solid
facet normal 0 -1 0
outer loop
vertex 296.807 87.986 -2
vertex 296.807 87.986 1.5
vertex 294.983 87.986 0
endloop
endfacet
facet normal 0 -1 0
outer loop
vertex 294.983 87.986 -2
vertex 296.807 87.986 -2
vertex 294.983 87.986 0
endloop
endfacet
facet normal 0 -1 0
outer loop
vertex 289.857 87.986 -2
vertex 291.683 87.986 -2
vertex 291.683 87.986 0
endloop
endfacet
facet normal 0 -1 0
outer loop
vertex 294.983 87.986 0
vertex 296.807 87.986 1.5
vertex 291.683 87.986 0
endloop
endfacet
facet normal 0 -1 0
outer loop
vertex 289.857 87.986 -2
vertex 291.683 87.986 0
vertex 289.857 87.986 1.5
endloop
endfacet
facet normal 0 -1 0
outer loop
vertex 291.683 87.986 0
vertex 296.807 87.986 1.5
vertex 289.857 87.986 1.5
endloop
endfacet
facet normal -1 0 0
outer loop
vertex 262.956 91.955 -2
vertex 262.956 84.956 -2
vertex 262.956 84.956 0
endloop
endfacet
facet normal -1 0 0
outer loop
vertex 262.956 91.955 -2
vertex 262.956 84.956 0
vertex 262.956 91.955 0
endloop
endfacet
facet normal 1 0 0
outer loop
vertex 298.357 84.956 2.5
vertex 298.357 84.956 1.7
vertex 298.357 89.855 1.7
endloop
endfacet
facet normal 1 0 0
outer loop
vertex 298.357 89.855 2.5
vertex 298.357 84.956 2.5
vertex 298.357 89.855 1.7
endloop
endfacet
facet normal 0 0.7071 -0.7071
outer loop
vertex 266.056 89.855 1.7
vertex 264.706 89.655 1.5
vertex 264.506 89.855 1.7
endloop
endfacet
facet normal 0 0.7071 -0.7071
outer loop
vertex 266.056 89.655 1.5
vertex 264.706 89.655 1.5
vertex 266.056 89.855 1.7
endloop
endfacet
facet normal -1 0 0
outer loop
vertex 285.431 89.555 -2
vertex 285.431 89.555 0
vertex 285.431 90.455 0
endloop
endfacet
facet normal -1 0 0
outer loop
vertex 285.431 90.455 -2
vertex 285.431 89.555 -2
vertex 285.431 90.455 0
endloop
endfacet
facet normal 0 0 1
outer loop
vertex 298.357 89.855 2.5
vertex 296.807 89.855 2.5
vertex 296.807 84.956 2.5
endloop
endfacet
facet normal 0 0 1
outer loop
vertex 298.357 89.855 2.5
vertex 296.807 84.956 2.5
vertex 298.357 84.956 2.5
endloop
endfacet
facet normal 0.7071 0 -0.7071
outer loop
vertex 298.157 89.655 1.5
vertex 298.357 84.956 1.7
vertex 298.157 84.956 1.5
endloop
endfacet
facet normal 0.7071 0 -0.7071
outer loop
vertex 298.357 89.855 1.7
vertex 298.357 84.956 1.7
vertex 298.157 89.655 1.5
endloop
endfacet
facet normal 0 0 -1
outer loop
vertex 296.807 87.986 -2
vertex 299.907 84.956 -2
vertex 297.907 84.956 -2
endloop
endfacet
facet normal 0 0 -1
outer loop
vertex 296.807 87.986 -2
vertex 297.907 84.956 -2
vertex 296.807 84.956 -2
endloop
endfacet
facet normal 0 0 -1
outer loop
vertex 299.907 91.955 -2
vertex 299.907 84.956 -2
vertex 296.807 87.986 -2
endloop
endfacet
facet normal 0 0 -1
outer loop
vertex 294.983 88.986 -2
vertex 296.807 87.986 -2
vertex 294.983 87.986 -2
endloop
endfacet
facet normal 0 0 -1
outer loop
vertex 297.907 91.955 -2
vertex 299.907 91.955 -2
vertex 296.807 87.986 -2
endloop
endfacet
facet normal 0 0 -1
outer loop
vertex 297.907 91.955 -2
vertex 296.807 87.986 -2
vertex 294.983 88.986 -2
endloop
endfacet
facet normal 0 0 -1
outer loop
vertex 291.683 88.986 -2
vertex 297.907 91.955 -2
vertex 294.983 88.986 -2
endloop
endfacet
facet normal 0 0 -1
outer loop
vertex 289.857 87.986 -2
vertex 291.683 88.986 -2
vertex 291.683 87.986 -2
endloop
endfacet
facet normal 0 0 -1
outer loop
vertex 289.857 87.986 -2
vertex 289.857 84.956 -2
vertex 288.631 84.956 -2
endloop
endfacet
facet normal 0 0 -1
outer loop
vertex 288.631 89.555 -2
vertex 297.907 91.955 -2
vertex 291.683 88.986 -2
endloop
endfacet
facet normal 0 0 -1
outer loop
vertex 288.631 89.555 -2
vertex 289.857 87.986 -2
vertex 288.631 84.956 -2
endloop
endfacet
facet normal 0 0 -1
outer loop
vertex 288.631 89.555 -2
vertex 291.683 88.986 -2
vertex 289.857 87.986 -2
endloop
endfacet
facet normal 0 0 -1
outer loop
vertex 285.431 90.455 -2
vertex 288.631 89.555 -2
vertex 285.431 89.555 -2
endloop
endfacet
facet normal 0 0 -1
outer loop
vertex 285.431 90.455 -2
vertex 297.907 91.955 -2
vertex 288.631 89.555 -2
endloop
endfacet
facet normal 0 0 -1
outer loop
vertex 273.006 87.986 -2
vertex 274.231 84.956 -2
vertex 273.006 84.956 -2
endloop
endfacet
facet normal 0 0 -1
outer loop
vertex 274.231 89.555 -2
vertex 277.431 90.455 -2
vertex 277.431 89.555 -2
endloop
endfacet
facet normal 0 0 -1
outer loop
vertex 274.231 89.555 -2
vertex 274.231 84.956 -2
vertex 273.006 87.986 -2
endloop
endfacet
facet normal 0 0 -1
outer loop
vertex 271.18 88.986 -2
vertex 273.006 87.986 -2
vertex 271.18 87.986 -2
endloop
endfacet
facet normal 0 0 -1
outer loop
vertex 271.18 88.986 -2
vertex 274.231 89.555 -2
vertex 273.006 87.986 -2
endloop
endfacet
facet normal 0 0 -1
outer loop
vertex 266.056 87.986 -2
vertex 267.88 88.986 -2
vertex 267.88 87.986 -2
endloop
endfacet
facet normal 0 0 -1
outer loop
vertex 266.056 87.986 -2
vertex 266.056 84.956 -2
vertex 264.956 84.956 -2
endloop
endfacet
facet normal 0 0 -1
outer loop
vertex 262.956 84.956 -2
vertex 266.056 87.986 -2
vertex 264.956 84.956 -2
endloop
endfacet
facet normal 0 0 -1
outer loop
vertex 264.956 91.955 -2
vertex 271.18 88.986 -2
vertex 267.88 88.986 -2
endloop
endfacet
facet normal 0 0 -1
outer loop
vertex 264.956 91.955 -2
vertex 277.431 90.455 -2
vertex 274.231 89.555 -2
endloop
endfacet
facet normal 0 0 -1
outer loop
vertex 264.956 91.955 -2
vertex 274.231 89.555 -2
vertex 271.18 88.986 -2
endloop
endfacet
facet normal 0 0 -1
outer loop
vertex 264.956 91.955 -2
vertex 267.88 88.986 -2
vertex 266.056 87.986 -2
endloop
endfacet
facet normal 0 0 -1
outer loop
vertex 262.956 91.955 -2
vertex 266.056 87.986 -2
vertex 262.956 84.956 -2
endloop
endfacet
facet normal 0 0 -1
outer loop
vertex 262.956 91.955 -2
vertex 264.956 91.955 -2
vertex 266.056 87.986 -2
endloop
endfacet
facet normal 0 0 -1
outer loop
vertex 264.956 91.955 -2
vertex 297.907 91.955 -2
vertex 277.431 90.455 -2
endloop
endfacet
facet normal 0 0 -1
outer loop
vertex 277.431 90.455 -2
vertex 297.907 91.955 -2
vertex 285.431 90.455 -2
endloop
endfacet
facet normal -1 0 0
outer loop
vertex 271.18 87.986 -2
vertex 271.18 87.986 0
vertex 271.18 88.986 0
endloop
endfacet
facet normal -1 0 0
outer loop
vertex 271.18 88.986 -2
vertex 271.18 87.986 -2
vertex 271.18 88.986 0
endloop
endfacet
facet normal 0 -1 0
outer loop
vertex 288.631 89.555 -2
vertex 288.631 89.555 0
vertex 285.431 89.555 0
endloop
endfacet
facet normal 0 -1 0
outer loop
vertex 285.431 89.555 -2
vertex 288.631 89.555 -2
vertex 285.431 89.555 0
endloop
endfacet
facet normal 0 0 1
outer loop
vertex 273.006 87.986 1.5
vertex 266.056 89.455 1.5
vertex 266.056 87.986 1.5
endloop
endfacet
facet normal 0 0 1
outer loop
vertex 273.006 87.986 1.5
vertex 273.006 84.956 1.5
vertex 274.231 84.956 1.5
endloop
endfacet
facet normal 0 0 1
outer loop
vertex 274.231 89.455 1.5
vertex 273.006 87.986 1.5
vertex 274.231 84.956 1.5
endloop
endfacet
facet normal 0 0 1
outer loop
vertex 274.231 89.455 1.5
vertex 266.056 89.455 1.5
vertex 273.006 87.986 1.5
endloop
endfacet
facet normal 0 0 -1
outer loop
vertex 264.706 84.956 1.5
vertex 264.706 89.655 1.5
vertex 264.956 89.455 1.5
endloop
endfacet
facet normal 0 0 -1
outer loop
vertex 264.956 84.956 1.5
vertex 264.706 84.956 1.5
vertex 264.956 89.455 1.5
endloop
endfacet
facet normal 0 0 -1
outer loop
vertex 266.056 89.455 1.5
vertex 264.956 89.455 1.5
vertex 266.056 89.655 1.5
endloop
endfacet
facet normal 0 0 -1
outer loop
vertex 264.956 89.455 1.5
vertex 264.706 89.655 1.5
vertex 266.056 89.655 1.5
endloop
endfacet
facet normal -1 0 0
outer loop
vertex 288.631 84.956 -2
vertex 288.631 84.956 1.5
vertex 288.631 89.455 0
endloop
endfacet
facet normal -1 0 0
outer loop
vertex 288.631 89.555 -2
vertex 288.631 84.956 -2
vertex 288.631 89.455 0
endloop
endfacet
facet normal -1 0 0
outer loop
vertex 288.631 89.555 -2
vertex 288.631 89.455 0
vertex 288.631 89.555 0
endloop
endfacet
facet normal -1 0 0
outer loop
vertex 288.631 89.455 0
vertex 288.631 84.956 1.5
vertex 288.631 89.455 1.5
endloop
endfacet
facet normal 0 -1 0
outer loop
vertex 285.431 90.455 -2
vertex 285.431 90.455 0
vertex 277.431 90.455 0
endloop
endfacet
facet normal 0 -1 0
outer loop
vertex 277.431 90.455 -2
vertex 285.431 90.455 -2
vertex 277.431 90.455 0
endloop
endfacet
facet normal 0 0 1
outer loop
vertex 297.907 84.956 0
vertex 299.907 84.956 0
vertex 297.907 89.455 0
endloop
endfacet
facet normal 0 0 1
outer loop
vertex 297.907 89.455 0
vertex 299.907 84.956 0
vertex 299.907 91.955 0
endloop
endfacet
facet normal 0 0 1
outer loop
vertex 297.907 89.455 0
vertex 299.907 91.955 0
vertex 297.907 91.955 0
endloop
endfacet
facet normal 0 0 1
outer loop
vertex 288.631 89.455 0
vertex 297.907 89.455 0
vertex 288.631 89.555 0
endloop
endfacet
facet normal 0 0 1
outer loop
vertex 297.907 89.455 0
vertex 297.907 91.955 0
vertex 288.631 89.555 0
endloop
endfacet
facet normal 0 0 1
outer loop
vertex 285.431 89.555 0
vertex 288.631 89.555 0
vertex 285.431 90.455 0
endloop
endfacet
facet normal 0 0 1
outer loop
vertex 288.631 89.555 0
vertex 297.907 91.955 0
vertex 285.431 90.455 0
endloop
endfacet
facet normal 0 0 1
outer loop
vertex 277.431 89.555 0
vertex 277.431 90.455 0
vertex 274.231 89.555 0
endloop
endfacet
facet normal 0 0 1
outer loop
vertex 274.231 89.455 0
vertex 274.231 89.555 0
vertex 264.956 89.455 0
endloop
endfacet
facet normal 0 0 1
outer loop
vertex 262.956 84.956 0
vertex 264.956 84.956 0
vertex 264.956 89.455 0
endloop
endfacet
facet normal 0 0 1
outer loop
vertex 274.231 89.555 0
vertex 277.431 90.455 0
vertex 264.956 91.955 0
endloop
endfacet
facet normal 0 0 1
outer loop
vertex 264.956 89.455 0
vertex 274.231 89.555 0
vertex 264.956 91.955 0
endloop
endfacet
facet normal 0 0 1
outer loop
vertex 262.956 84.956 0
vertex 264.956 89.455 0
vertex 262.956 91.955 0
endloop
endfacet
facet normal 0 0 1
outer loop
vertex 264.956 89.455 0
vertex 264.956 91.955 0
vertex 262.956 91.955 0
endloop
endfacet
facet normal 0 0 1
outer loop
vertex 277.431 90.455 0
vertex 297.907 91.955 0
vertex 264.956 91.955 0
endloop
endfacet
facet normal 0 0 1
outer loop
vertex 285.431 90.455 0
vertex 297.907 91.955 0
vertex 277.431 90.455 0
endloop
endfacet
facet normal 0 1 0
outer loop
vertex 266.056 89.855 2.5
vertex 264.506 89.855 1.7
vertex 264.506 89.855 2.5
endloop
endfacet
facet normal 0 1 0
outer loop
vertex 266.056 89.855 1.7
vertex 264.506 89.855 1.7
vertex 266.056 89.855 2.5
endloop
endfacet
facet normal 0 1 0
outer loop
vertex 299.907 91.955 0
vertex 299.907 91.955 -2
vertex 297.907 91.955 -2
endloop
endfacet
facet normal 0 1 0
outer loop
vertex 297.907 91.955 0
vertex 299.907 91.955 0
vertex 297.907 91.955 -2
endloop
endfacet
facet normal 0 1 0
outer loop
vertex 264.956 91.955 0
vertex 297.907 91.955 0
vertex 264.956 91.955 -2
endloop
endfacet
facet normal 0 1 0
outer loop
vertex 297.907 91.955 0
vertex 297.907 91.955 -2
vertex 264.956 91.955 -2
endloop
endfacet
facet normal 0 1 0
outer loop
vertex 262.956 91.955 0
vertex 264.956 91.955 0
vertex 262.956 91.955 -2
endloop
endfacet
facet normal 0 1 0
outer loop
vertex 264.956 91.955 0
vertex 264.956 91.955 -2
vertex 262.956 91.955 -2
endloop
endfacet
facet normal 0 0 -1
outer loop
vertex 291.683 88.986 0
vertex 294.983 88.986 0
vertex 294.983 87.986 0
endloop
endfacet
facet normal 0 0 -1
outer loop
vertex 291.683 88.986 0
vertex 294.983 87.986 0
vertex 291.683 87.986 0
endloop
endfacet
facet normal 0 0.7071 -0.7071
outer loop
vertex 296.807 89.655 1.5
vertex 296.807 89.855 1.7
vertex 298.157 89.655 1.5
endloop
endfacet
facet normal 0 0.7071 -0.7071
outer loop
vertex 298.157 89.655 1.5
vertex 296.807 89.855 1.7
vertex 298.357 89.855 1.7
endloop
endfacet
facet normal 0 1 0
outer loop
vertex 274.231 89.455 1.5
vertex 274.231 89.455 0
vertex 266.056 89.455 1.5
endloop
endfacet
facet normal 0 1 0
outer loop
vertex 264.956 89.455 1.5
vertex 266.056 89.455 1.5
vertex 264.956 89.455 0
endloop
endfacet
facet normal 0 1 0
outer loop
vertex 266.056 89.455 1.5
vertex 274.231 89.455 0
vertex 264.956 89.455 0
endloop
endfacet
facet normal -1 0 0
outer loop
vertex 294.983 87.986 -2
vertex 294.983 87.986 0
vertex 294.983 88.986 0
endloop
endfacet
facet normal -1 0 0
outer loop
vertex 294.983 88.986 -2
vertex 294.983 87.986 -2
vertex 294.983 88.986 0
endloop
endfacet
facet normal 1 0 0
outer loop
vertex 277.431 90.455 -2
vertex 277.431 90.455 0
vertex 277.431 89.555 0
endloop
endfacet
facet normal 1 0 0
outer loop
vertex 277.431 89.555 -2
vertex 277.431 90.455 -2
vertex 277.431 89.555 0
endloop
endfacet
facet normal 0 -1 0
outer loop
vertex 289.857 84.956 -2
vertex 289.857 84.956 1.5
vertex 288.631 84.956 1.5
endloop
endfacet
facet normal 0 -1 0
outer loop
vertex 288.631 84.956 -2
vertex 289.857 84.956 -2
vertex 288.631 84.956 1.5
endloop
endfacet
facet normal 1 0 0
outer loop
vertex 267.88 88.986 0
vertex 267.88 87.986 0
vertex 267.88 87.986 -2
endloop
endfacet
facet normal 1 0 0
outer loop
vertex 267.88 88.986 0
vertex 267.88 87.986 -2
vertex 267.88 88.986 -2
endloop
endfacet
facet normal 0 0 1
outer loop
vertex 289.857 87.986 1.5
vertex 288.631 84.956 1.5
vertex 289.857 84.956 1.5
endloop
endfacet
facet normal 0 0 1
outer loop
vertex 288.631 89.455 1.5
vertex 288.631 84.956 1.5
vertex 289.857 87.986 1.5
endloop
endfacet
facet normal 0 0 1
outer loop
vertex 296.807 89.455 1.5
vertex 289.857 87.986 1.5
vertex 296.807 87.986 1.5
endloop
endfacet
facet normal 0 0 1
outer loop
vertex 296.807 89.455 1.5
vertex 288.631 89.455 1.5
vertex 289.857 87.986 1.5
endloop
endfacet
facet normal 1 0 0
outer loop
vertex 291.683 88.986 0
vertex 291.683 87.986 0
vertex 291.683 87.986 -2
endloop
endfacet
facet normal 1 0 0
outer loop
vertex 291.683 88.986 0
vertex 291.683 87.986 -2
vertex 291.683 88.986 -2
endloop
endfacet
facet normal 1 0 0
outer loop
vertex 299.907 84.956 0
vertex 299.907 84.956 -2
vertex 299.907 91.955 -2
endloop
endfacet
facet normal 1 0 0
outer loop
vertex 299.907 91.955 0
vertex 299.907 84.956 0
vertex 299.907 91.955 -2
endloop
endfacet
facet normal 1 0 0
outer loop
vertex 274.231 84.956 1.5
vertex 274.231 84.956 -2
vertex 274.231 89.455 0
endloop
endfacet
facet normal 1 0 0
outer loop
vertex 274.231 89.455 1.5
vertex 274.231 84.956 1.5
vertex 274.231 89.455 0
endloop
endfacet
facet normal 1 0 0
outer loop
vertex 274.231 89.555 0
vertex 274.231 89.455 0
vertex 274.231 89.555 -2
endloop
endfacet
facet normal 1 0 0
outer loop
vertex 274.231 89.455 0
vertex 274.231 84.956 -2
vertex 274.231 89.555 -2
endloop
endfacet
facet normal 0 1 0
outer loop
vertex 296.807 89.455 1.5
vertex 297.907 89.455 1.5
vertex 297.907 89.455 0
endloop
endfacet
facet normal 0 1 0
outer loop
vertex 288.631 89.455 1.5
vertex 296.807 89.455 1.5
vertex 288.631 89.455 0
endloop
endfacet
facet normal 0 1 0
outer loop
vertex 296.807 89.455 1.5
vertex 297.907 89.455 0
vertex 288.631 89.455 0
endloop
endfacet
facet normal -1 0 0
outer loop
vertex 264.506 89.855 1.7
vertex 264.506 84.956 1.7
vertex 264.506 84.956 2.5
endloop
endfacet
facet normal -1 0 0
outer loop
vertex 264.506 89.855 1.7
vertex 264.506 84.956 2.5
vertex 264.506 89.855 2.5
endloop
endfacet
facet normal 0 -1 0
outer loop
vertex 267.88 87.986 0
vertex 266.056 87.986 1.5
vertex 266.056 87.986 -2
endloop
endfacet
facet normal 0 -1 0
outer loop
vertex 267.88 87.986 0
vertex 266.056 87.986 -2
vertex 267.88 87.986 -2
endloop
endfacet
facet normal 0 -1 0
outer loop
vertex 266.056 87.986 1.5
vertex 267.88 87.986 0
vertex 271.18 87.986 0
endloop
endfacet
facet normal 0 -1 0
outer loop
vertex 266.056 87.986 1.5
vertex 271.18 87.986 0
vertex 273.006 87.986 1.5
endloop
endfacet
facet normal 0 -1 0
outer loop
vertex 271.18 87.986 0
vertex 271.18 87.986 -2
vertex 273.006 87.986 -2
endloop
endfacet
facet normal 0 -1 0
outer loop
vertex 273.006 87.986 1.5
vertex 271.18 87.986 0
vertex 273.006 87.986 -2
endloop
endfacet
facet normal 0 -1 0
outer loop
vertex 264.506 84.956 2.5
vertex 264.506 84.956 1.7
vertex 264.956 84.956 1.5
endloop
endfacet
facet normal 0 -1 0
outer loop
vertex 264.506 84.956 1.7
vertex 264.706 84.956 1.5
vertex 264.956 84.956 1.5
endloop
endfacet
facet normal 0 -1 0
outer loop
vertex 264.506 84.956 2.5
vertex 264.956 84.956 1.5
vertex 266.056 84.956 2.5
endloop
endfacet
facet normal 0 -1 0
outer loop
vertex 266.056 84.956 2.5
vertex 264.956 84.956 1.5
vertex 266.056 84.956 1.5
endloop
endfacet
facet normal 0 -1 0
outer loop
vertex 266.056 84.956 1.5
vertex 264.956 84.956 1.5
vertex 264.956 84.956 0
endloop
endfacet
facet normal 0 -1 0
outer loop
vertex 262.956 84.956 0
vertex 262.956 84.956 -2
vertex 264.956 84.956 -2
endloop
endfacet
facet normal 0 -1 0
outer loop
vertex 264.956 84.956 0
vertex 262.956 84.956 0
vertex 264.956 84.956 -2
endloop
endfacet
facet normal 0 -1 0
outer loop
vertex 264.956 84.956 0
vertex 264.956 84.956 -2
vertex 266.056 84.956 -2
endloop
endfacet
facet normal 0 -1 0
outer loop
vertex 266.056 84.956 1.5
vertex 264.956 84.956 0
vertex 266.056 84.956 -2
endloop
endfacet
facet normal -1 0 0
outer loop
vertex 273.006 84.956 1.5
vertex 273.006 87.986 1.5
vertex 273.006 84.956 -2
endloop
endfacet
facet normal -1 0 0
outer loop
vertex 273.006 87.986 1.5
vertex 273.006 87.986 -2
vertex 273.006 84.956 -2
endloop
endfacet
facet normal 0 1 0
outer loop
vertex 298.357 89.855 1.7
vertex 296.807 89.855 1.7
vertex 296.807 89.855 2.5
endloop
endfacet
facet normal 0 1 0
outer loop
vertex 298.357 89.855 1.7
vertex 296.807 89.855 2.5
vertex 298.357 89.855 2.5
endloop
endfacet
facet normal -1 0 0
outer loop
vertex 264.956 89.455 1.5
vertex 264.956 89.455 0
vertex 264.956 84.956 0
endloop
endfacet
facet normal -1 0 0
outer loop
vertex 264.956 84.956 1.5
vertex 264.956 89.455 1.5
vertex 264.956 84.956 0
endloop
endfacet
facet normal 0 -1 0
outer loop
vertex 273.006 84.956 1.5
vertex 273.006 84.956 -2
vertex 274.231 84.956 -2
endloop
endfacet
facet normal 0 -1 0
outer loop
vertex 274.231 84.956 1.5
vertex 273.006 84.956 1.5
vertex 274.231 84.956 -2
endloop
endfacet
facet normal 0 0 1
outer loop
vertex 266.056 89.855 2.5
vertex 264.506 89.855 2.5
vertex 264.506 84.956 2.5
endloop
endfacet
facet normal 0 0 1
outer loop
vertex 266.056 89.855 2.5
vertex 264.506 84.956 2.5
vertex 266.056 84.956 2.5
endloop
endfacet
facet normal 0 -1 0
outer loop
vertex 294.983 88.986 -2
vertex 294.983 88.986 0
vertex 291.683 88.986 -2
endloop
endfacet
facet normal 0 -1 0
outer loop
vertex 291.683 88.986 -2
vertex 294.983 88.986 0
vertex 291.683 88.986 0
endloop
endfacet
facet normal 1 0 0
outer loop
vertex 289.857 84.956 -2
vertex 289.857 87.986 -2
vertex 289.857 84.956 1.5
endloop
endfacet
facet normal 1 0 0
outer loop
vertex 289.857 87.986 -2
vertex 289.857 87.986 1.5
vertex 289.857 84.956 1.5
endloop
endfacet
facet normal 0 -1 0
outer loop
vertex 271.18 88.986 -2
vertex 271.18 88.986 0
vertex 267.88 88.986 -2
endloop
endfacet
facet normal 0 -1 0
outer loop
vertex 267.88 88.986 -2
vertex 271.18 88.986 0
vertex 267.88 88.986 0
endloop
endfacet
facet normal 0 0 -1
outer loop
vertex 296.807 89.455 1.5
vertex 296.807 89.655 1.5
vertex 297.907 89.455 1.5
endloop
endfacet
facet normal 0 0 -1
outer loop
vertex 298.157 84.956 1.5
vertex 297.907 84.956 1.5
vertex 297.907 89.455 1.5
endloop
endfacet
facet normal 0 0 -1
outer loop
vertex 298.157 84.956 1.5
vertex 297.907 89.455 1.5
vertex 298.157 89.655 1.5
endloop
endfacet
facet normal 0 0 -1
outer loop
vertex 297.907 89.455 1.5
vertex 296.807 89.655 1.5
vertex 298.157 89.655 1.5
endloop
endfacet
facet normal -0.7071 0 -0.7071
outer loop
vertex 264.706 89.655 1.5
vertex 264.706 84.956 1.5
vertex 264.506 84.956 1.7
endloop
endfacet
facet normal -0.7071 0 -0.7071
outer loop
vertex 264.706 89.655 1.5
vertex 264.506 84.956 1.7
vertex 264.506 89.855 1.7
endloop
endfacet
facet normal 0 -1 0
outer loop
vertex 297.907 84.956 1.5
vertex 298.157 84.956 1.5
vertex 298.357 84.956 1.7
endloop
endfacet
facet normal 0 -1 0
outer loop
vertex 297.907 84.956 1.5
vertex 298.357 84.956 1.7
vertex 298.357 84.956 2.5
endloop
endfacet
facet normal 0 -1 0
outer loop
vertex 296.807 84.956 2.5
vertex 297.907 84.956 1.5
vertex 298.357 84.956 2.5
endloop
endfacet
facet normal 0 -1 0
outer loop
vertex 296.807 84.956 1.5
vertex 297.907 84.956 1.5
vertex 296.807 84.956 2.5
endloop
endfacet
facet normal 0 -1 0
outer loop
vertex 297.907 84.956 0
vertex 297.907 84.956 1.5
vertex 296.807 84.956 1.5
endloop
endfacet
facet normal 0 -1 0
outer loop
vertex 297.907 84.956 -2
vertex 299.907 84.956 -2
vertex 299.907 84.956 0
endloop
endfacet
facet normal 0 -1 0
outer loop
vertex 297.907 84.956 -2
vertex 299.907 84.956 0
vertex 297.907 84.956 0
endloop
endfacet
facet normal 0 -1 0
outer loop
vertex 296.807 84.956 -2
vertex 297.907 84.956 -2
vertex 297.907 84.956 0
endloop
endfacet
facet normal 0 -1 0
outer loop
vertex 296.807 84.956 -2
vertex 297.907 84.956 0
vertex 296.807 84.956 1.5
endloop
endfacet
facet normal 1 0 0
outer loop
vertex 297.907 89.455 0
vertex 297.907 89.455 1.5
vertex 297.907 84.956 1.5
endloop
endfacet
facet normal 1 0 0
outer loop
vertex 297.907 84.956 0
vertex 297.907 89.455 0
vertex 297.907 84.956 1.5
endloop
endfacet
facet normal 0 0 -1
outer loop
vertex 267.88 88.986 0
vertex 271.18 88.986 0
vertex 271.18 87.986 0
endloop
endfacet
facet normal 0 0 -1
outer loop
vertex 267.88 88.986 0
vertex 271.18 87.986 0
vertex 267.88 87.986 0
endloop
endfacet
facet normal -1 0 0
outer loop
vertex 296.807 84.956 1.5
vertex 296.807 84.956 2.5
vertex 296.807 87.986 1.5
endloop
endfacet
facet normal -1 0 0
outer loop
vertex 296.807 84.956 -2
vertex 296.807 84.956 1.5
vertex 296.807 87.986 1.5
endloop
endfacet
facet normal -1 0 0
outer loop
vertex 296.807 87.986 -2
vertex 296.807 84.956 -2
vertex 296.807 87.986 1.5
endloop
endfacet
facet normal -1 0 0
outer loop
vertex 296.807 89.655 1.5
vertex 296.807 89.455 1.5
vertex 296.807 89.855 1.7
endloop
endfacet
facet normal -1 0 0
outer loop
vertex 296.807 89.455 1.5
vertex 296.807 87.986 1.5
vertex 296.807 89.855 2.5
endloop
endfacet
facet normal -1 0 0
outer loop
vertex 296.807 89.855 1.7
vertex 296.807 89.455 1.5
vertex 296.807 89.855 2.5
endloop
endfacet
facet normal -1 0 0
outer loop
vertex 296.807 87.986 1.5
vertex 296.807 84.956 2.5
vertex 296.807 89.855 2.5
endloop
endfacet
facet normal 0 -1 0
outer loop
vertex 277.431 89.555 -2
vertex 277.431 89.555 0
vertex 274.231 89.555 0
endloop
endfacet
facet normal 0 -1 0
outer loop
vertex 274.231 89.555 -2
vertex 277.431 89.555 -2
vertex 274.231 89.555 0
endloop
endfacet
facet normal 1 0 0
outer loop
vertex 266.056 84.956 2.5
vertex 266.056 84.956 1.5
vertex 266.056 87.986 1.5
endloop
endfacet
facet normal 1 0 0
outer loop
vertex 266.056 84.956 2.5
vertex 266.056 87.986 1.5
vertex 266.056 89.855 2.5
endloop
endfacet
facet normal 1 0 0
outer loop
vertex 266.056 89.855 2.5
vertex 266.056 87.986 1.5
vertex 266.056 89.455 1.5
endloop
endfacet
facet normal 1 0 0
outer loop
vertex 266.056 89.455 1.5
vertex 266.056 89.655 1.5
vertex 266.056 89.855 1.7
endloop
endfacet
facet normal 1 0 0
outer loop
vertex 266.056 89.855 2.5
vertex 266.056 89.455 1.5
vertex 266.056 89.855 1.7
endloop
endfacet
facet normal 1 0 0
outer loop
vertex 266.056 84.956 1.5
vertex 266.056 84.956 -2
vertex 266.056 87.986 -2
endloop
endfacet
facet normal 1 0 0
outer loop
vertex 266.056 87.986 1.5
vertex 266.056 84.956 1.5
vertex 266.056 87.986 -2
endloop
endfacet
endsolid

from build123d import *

# Parameters (mm, degrees)
BOSS_EXTRUDE1_DEPTH = 2
BOSS_EXTRUDE2_DEPTH = 1.5
SKETCH4_W           = 1.550075991
SKETCH4_H           = 4.899134607
BOSS_EXTRUDE3_DEPTH = 1
CHAMFER1_SIZE       = 0.2
CUT_EXTRUDE1_START  = -2
SKETCH5_W           = 3.300200616
SKETCH5_H           = 1
SKETCH5_W_2         = 3.300200617
CUT_EXTRUDE1_DEPTH  = 2
SKETCH6_W           = 2
SKETCH6_H           = 6.999134607
BOSS_EXTRUDE4_DEPTH = 2


with BuildPart() as part:
    # Sketch2 → Boss-Extrude1 (new body)
    with BuildSketch(Plane.XY):
        Polygon((285.431409328, 90.45473243), (277.431409328, 90.45473243), (277.431409328, 89.55473243), (274.231409328, 89.55473243), (274.231409328, 84.955597823), (273.006316619, 84.955597823), (273.006316619, 87.985794184), (266.055906266, 87.985794184), (266.055906266, 84.955597823), (264.955830275, 84.955597823), (264.955830275, 91.95473243), (297.906988381, 91.95473243), (297.906988381, 84.955597823), (296.80691239, 84.955597823), (296.80691239, 87.985794184), (289.856502038, 87.985794184), (289.856502038, 84.955597823), (288.631409328, 84.955597823), (288.631409328, 89.55473243), (285.431409328, 89.55473243), align=None)
    extrude(amount=-BOSS_EXTRUDE1_DEPTH)

    # Sketch3 → Boss-Extrude2 (add)
    with BuildSketch(Plane.XY):
        Polygon((274.231409328, 89.45473243), (264.955830275, 89.45473243), (264.955830275, 84.955597823), (266.055906266, 84.955597823), (266.055906266, 87.985794184), (273.006316619, 87.985794184), (273.006316619, 84.955597823), (274.231409328, 84.955597823), align=None)
        Polygon((297.906988381, 89.45473243), (288.631409328, 89.45473243), (288.631409328, 84.955597823), (289.856502038, 84.955597823), (289.856502038, 87.985794184), (296.80691239, 87.985794184), (296.80691239, 84.955597823), (297.906988381, 84.955597823), align=None)
    extrude(amount=BOSS_EXTRUDE2_DEPTH)

    # Sketch4 → Boss-Extrude3 (add)
    with BuildSketch(Plane.XY.offset(1.5)):
        with Locations((265.280868271, 87.405165127)):
            Rectangle(SKETCH4_W, SKETCH4_H)
        with Locations((297.581950386, 87.405165127)):
            Rectangle(SKETCH4_W, SKETCH4_H)
    extrude(amount=BOSS_EXTRUDE3_DEPTH)

    # Chamfer1
    chamfer1_edges = [part.edges().sort_by_distance(p)[0] for p in [
        (264.505830275, 87.405165127, 1.5),
        (265.280868271, 89.85473243, 1.5),
        (298.356988381, 87.405165127, 1.5),
        (297.581950386, 89.85473243, 1.5),
    ]]
    chamfer(chamfer1_edges, length=CHAMFER1_SIZE)

    # Sketch5 → Cut-Extrude1 (cut)
    with BuildSketch(Plane(origin=(0, 0, -2), x_dir=(-1, 0, 0), z_dir=(0, 0, -1)).offset(CUT_EXTRUDE1_START)):
        with Locations((-269.530111382, 88.485794184)):
            Rectangle(SKETCH5_W, SKETCH5_H)
        with Locations((-293.332707275, 88.485794184)):
            Rectangle(SKETCH5_W_2, SKETCH5_H)
    extrude(amount=CUT_EXTRUDE1_DEPTH, mode=Mode.SUBTRACT)

    # Sketch6 → Boss-Extrude4 (add)
    with BuildSketch(Plane(origin=(0, 0, -2), x_dir=(-1, 0, 0), z_dir=(0, 0, -1))):
        with Locations((-298.906988381, 88.455165127)):
            Rectangle(SKETCH6_W, SKETCH6_H)
        with Locations((-263.955830275, 88.455165127)):
            Rectangle(SKETCH6_W, SKETCH6_H)
    extrude(amount=-BOSS_EXTRUDE4_DEPTH)


solid = part.part
